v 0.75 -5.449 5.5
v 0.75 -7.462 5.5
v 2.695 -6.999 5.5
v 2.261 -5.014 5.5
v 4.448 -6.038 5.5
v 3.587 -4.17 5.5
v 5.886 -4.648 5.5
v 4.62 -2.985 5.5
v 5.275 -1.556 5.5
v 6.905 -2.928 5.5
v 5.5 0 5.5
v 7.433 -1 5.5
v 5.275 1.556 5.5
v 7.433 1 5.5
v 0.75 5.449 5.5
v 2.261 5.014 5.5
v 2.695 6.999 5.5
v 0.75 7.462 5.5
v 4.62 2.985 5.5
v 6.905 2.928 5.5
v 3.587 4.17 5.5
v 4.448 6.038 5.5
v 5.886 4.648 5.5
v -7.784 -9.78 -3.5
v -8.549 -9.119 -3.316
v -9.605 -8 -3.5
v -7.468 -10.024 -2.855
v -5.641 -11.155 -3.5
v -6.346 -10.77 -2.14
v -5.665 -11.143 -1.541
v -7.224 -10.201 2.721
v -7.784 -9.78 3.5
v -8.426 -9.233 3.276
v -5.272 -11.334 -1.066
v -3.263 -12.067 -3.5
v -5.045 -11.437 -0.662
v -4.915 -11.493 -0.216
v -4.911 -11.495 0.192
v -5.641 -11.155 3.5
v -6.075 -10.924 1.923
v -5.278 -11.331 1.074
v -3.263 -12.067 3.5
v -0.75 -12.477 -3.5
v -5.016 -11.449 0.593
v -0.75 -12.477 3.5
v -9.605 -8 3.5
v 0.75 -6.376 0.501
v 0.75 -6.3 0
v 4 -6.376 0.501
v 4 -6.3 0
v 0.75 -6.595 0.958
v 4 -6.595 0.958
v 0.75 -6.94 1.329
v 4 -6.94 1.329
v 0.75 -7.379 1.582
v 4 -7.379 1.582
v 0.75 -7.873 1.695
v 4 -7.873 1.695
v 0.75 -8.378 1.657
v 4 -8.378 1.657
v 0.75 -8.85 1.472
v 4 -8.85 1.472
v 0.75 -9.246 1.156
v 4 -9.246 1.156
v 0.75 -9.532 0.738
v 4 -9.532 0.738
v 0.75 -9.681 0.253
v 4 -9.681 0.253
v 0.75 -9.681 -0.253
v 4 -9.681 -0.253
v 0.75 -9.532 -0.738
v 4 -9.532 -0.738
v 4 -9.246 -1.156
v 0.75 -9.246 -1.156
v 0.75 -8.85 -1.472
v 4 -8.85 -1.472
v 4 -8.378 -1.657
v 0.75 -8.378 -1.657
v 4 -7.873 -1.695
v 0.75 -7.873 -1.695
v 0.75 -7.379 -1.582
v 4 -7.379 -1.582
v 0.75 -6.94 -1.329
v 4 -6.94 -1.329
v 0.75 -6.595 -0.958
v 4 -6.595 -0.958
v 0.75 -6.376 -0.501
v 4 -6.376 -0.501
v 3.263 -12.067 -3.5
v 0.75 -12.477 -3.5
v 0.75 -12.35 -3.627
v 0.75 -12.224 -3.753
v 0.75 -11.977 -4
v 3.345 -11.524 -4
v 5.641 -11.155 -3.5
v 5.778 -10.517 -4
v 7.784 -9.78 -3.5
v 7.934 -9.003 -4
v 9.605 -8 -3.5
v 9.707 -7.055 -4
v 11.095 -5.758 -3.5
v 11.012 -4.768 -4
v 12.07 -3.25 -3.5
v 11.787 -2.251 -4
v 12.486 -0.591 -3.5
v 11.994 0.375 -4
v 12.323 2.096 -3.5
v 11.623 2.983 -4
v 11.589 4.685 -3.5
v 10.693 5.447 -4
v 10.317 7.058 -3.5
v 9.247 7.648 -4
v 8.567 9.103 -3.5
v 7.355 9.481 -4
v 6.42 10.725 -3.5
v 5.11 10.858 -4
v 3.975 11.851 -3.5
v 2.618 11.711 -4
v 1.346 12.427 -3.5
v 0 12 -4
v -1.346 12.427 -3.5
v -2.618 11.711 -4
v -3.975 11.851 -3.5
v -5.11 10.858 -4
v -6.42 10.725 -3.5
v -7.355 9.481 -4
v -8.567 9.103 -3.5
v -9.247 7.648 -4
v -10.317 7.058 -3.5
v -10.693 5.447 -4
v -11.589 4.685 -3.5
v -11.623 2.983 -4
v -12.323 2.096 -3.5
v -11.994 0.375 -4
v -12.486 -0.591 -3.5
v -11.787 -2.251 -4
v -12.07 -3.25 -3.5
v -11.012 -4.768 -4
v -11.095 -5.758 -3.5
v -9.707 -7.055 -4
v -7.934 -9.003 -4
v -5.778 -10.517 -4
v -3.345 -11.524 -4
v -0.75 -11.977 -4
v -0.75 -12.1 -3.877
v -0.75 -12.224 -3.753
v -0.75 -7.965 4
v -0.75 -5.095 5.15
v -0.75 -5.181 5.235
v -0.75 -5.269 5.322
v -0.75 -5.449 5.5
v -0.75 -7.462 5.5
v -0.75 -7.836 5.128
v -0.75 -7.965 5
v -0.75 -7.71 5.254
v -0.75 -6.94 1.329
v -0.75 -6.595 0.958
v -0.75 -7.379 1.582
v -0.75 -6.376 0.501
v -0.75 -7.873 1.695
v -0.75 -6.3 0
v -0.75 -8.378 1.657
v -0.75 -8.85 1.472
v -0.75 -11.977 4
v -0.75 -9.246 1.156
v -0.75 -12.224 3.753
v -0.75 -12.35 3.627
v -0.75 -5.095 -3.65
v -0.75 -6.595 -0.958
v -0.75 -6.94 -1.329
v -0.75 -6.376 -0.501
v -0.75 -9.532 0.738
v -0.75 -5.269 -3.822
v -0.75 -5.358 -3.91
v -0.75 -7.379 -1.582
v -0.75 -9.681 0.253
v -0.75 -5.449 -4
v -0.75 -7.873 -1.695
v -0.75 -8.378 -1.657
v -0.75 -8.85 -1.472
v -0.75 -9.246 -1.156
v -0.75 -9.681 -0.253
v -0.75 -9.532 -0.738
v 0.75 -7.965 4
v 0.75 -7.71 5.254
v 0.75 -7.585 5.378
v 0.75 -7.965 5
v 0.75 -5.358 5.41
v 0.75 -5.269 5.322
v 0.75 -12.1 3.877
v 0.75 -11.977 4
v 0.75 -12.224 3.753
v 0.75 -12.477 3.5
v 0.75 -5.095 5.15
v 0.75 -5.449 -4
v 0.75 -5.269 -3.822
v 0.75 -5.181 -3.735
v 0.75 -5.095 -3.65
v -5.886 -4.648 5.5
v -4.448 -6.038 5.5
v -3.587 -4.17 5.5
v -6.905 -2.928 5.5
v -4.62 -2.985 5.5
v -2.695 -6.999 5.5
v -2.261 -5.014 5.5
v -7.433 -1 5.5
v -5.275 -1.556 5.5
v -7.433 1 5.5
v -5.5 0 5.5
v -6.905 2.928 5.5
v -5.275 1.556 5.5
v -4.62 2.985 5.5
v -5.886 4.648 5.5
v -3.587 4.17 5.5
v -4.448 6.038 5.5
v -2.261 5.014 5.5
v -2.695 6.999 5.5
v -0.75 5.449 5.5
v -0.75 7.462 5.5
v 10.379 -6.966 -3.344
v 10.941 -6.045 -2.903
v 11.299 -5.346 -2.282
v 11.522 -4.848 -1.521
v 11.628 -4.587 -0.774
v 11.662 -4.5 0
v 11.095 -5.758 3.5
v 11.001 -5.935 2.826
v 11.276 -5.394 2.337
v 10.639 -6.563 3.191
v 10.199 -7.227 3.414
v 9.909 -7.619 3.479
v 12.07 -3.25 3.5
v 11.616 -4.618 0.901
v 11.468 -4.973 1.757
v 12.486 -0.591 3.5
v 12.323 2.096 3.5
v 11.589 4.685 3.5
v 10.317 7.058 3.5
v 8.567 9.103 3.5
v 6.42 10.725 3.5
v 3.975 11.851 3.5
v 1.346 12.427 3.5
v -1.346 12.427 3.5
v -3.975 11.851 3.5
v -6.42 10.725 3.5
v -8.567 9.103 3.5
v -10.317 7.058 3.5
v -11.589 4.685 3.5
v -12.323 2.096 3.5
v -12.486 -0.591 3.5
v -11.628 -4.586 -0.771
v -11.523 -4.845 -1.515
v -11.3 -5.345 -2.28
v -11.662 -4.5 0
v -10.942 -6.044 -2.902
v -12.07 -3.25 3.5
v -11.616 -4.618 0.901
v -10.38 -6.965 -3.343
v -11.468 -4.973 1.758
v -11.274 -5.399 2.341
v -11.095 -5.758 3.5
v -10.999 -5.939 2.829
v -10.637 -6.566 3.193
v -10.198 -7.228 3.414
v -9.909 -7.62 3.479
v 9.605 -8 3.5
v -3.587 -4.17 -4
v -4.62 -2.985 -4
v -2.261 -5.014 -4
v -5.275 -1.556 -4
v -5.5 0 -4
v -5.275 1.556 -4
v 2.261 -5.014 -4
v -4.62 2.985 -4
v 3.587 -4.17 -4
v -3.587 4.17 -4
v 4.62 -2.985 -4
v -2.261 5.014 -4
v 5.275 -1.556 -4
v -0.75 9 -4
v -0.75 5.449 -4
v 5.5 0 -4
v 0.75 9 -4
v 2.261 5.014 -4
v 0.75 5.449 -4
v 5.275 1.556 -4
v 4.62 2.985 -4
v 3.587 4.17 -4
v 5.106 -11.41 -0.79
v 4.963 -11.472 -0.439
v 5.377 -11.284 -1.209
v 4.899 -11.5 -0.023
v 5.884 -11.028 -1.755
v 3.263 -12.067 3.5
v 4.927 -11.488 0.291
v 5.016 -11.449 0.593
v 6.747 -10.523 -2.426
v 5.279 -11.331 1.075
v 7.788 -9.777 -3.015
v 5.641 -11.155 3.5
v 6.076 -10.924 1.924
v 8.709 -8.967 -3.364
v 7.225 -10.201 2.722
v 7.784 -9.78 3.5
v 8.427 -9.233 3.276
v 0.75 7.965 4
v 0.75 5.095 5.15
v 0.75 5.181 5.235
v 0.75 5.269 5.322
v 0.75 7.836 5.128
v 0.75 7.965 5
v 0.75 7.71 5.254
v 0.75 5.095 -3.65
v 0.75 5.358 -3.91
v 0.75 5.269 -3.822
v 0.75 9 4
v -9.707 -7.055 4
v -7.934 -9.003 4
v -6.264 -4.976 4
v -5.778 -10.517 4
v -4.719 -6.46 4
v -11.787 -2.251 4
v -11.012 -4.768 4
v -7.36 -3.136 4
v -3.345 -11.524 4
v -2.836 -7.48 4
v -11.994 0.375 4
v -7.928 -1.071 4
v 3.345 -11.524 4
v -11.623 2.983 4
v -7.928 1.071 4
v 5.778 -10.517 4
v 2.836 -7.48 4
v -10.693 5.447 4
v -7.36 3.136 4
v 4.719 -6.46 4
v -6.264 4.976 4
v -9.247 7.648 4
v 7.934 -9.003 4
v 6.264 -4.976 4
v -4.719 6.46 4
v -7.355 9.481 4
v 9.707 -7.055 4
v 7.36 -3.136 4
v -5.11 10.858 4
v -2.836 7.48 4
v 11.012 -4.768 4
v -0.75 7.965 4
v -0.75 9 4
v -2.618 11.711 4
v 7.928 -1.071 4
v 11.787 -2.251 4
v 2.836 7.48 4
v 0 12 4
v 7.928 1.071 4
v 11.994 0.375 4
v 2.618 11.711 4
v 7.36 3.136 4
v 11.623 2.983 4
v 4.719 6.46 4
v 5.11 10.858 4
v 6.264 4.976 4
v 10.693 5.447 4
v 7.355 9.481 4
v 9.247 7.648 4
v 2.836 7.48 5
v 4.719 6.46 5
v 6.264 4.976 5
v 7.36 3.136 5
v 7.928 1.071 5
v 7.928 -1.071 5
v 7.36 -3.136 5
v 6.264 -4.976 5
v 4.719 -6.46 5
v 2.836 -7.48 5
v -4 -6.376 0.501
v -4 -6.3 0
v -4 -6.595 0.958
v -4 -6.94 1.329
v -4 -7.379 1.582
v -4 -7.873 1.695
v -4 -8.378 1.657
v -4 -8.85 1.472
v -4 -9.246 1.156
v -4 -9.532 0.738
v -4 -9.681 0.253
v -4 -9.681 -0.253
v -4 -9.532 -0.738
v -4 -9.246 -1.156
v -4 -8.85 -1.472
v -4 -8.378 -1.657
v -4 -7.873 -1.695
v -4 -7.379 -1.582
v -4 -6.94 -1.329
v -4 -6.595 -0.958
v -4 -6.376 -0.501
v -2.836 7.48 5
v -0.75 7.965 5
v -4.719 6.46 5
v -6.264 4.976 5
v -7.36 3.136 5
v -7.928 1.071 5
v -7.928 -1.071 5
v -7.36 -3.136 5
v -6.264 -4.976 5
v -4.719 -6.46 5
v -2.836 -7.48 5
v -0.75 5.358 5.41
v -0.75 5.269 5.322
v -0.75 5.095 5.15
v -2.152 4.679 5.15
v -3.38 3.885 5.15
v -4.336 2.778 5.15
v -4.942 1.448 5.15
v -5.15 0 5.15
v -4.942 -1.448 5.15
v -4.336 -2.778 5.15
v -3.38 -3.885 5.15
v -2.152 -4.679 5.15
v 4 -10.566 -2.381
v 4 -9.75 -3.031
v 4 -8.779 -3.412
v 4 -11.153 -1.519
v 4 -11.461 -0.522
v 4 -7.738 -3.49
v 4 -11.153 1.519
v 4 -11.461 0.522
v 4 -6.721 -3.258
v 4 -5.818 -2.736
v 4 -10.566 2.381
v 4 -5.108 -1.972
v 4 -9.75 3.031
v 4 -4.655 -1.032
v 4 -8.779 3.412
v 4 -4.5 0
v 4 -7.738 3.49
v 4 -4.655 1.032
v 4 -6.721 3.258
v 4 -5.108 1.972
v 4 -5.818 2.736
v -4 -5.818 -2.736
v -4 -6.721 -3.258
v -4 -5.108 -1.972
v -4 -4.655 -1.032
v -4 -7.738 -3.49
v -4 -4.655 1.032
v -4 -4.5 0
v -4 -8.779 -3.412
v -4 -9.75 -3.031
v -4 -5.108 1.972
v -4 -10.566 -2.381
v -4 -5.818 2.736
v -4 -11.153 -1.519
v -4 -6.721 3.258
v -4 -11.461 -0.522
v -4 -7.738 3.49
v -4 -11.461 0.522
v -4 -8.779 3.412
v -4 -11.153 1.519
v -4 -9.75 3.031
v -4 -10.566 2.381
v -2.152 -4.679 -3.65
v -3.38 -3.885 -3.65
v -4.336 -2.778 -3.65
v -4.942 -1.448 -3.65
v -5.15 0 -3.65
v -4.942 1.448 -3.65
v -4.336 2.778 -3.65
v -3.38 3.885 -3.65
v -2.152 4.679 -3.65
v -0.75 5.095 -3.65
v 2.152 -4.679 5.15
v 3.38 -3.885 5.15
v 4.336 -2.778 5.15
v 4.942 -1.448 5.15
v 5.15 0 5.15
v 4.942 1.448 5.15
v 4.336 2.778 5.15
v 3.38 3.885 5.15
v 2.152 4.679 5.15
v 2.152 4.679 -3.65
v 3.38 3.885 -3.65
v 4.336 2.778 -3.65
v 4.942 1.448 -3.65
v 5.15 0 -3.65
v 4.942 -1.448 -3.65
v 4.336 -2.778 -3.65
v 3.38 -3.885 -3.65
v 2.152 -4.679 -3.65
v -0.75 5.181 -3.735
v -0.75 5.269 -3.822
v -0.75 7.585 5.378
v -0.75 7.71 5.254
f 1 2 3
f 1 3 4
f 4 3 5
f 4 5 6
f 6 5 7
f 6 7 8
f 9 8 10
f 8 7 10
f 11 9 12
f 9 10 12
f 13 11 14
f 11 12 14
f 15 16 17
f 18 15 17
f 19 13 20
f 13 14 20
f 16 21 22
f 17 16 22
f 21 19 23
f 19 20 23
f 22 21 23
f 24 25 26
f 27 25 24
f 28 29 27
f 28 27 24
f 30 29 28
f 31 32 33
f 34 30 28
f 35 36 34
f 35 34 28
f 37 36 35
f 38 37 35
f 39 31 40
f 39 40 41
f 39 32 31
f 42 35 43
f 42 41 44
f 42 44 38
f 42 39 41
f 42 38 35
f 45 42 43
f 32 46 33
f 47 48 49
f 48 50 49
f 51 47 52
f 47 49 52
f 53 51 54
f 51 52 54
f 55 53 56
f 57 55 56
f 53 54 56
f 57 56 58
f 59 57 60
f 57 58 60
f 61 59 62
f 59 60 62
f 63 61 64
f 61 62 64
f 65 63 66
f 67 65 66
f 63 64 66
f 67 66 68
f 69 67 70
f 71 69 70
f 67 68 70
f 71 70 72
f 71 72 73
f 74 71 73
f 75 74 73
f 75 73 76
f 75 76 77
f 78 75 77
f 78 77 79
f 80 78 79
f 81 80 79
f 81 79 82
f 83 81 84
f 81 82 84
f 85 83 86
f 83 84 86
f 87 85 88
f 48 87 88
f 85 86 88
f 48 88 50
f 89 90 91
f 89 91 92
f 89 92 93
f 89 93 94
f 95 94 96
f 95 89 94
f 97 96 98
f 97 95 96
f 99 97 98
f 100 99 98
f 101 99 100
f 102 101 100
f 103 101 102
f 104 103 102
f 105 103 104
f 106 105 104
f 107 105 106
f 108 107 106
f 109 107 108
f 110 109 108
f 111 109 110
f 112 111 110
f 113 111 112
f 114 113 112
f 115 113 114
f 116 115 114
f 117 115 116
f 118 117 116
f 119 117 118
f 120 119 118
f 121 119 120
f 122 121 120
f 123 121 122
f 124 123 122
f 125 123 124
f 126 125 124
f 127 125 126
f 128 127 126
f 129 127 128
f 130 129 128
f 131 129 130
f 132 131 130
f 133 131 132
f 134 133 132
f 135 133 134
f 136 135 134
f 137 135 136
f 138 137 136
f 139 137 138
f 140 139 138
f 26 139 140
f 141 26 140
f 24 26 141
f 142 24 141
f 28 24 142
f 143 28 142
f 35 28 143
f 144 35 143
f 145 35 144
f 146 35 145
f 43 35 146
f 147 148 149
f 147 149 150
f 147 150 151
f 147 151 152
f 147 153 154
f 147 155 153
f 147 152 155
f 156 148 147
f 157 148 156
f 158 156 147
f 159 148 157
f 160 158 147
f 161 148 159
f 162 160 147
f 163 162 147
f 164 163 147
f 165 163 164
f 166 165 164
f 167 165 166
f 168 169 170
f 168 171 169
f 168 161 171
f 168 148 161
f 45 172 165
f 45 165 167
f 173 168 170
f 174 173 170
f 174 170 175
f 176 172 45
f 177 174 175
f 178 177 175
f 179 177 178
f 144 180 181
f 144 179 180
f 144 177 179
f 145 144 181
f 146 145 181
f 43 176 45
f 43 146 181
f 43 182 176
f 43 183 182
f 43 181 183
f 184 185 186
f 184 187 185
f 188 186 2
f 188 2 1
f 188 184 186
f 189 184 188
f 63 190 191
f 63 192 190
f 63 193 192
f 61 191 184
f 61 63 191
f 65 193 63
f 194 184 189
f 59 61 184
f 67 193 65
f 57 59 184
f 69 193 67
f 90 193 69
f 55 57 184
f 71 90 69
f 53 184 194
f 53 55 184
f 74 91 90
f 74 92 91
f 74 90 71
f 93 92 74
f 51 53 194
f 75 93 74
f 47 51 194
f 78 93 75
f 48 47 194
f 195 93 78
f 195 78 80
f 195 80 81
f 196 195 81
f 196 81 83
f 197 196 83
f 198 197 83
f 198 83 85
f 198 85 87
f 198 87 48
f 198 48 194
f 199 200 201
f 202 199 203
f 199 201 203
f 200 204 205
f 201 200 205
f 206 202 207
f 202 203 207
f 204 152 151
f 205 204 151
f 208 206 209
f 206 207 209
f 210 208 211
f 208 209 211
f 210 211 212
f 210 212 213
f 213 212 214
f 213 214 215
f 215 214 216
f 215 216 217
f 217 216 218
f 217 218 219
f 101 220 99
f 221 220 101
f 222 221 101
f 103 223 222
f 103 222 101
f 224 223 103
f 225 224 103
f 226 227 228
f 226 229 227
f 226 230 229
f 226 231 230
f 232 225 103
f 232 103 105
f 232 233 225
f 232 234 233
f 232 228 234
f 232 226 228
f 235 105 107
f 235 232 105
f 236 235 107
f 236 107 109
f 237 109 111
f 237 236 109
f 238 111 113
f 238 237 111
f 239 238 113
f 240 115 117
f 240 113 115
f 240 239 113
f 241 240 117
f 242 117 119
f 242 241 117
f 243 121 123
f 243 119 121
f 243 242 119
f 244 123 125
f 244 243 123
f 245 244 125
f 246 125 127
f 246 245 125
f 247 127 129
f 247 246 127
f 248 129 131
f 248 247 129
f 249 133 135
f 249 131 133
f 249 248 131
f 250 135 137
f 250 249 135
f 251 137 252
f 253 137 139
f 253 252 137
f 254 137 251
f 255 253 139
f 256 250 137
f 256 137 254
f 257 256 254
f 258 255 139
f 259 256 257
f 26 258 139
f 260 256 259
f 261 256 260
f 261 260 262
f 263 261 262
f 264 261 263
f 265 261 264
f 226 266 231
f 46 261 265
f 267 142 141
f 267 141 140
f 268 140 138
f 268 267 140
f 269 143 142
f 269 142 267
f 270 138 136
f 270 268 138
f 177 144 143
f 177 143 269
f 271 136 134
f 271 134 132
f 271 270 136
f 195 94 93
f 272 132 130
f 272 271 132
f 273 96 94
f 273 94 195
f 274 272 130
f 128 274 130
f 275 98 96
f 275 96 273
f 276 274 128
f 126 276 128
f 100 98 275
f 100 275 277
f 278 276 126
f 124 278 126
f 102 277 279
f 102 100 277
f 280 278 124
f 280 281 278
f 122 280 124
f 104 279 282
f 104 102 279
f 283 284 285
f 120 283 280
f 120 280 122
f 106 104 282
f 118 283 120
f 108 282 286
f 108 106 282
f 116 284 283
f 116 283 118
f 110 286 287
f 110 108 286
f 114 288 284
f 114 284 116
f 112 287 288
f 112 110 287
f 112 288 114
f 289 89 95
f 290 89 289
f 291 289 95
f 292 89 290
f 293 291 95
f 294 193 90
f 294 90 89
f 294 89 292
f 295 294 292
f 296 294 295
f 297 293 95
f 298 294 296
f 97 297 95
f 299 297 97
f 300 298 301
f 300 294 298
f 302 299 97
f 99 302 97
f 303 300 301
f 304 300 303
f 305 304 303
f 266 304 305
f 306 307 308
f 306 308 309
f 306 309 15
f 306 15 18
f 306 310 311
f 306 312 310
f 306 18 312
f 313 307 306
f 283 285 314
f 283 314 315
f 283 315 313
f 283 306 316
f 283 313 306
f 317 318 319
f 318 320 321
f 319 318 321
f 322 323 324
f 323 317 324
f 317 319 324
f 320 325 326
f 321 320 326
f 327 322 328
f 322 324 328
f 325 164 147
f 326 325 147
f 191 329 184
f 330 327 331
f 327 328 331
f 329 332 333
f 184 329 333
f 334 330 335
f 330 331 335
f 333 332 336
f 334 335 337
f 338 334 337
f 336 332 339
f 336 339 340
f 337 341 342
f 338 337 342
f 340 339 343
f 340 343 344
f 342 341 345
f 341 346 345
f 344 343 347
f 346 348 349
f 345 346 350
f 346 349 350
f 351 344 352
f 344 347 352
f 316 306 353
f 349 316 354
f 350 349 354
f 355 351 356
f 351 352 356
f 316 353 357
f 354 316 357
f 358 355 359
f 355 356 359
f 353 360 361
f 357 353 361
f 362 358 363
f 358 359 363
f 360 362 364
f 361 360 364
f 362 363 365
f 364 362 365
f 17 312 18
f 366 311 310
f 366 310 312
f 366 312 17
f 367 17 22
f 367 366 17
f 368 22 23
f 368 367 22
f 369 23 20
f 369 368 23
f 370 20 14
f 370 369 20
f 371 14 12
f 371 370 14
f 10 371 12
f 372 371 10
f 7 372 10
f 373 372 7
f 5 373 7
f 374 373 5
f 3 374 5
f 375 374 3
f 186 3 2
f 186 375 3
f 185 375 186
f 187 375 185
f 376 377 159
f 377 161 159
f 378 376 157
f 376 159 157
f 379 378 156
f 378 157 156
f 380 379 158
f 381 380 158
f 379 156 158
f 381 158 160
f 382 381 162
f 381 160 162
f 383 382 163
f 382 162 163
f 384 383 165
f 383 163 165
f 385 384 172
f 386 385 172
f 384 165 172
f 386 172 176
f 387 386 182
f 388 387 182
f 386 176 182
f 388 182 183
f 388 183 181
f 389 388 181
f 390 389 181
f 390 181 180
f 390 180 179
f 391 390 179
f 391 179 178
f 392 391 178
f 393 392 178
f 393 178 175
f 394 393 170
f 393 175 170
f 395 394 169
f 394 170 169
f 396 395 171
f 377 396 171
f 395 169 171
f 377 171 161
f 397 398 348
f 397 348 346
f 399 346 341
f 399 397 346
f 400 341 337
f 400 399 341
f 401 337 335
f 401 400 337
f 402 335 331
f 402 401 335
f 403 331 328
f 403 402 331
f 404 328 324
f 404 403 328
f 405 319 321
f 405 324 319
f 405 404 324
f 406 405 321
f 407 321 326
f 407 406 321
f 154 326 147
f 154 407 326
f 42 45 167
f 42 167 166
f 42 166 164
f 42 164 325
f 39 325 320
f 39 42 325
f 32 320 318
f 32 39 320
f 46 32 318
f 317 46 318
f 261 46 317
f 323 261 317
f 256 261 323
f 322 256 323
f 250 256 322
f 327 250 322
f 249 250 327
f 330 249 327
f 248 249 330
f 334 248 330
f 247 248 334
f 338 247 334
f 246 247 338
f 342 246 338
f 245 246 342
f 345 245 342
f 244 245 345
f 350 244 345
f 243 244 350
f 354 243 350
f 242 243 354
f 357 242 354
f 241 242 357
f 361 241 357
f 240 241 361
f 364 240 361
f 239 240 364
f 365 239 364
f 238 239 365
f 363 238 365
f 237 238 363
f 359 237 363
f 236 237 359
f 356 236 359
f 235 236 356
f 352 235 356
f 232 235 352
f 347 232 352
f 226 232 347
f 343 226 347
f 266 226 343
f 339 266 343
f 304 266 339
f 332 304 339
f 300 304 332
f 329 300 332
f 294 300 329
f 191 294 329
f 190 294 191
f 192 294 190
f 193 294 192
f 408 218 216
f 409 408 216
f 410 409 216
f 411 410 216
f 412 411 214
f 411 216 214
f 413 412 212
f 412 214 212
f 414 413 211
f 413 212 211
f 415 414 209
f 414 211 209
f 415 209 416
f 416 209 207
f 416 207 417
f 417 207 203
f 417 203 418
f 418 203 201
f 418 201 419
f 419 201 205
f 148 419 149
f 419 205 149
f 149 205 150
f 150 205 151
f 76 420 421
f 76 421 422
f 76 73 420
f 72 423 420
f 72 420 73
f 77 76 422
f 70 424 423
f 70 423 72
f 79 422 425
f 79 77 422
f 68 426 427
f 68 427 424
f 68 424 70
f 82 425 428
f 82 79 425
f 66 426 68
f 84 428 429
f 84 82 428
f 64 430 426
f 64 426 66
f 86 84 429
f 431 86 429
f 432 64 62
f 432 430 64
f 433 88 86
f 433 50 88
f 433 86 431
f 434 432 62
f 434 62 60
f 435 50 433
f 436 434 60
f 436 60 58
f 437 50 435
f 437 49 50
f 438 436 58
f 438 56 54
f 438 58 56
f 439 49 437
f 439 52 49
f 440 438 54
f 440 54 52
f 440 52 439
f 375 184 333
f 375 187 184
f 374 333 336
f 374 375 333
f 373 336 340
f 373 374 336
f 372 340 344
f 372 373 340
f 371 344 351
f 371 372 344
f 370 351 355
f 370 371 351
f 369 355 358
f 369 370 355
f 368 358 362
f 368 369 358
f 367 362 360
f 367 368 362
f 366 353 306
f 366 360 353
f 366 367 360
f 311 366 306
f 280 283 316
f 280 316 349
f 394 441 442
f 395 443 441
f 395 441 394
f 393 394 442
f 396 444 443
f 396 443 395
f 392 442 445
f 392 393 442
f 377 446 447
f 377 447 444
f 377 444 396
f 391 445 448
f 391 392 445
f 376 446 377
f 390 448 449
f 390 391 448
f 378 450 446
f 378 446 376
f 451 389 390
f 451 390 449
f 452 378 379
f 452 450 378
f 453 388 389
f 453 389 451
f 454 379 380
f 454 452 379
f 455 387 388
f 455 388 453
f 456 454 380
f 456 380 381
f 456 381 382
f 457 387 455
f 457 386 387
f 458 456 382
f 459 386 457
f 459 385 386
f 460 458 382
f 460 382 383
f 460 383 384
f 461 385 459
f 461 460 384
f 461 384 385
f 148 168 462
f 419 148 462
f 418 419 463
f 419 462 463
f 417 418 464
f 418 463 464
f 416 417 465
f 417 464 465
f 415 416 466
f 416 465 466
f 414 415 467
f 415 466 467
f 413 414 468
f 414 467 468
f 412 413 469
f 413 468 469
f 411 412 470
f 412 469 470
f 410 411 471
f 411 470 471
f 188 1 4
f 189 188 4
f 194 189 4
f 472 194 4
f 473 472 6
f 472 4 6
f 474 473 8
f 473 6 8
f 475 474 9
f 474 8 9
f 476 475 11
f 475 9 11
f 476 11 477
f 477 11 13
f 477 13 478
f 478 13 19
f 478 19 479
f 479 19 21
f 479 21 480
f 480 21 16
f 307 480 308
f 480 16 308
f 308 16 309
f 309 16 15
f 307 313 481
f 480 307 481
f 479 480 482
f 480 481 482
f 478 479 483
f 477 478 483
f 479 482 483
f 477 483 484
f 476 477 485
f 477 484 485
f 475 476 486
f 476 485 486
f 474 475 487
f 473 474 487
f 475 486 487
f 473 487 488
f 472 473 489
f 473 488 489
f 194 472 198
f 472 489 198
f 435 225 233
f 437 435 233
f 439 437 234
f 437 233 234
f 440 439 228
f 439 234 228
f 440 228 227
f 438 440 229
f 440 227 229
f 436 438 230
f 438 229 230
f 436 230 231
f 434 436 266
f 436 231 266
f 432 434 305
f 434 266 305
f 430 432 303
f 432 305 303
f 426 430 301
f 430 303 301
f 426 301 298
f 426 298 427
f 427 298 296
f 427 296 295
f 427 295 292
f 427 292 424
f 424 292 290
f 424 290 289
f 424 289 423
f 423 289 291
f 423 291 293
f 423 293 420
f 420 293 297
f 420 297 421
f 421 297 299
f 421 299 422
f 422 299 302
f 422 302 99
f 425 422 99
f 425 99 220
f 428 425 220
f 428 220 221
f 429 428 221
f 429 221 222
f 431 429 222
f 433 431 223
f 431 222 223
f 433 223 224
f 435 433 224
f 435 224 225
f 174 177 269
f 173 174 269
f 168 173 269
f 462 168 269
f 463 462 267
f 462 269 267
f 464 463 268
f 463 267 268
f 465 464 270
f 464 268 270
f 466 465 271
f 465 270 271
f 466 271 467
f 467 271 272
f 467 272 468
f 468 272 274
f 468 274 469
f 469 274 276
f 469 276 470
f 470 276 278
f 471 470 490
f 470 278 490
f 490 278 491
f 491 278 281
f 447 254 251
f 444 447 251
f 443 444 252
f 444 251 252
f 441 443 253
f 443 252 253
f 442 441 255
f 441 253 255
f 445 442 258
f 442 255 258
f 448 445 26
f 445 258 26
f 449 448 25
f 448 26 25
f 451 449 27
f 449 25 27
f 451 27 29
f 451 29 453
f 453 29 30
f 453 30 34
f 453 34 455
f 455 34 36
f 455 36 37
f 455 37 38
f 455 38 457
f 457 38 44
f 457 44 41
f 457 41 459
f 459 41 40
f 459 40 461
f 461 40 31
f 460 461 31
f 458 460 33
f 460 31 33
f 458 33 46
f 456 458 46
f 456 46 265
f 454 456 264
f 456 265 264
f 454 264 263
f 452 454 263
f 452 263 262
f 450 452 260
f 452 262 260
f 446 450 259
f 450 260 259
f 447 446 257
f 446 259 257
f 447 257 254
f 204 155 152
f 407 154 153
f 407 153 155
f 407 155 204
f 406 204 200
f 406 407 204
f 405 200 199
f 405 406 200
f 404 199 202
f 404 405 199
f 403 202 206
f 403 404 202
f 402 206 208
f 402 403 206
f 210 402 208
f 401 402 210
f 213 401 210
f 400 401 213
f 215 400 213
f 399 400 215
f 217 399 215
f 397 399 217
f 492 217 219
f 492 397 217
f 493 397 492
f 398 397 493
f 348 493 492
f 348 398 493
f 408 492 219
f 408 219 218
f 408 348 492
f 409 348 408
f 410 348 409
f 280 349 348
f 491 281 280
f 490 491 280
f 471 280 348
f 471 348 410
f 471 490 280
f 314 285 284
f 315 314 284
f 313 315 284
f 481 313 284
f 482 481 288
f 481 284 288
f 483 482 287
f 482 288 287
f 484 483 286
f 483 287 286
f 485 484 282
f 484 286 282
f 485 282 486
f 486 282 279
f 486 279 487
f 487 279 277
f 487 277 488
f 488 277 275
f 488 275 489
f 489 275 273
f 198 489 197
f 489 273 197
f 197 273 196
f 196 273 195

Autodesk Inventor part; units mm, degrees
sketch "Sketch_1" plane through (0, 0, 0) normal (1, 0, 0) x (0, 1, 0)
  line L0 (0, -4) -> (0, 5.5)
  line L1 (7.5, 5.5) -> (5.5, 5.5)
  line L2 (5.5, 5.5) -> (5, 5)
  line L3 (5, 5) -> (5, -3.5)
  line L4 (5, -3.5) -> (5.5, -4)
  line L5 (5.5, -4) -> (12, -4)
  line L6 (12, -4) -> (12.5, -3.5)
  line L7 (12.5, -3.5) -> (12.5, 3.5)
  line L8 (12.5, 3.5) -> (12, 4)
  line L9 (12, 4) -> (8, 4)
  line L10 (8, 4) -> (8, 5)
  line L11 (8, 5) -> (7.5, 5.5)
revolve "Revolution1" add sketch "Sketch_1" angle 360 about axis through (0, 0, -4) along (0, 0, -1)
sketch "Sketch_2" plane through (0, 0, 0) normal (0, 0, 1) x (1, 0, 0)
  line L0 (-0.75, -12.5) -> (0.75, -12.5)
  line L1 (0.75, -12.5) -> (0.75, 9)
  line L2 (0.75, 9) -> (-0.75, 9)
  line L3 (-0.75, 9) -> (-0.75, -12.5)
extrude "Extrusion1" cut sketch "Sketch_2" along normal mid plane 32
sketch "Sketch_3" plane through (0, 0, 0) normal (0, 0, 1) x (1, 0, 0)
  line L0 (0, -8) -> (12.5, -8)
  line L1 (12.5, -8) -> (12.5, -11)
  line L2 (12.5, -11) -> (4, -11)
  line L3 (4, -11) -> (4, -9.75)
  line L4 (4, -9.75) -> (0, -9.75)
  line L5 (0, -9.75) -> (0, -8)
  line L6 (0, -8) -> (12.5, -8)
ref_plane "body_screw_XY" through (4, -8, 0) normal (1, 0, 0) x (0, 0, -1)
ref_plane "body_screw_YZ" through (4, -8, 0) normal (0, 0, -1) x (0, 1, 0)
ref_plane "body_screw_ZX" through (4, -8, 0) normal (0, 1, 0) x (1, 0, 0)
ref_plane "作業平面5" through (4, -8, 0) normal (1, 0, 0) x (0, 0, -1)
sketch "スケッチ5" plane through (4, -8, 0) normal (1, 0, 0) x (0, 0, -1)
  point P0 (0, 8)
ref_plane "作業平面6" through (4, -8, 0) normal (1, 0, 0) x (0, 0, -1)
sketch "スケッチ6" plane through (4, -8, 0) normal (1, 0, 0) x (0, 0, -1)
  point P0 (0, 8)
sketch "スケッチ7" plane through (0, 0, -4) normal (0, 0, -1) x (-1, 0, 0)
  circle A0 centre (0, 0) radius 5.15
  dimension "d12" = 10.3
extrude "押し出し2" cut sketch "スケッチ7" against normal blind 10
ref_plane "作業平面4" through (12.5, 0, 0) normal (1, 0, 0) x (0, 1, 0)
sketch "スケッチ8" plane through (12.5, 0, 0) normal (1, 0, 0) x (0, 1, 0)
  circle A0 centre (-8, 0) radius 1.75 projected
  circle A1 centre (-8, 0) radius 1.7
  circle A2 centre (-8, 0) radius 3.5
  point P0 (0, 0)
  dimension "d15" = 3.4
  dimension "d16" = 7
extrude "押し出し3" cut sketch "スケッチ8" against normal through all contours A1
extrude "押し出し4" cut sketch "スケッチ8" against normal blind 8.5 contours A0 | A1 | A2
mirror "ミラー1" about plane through (0, 0, 0) normal (1, 0, 0) of "押し出し4"
properties part number "SCBNJ10-16b" material "ABS プラスチック"
